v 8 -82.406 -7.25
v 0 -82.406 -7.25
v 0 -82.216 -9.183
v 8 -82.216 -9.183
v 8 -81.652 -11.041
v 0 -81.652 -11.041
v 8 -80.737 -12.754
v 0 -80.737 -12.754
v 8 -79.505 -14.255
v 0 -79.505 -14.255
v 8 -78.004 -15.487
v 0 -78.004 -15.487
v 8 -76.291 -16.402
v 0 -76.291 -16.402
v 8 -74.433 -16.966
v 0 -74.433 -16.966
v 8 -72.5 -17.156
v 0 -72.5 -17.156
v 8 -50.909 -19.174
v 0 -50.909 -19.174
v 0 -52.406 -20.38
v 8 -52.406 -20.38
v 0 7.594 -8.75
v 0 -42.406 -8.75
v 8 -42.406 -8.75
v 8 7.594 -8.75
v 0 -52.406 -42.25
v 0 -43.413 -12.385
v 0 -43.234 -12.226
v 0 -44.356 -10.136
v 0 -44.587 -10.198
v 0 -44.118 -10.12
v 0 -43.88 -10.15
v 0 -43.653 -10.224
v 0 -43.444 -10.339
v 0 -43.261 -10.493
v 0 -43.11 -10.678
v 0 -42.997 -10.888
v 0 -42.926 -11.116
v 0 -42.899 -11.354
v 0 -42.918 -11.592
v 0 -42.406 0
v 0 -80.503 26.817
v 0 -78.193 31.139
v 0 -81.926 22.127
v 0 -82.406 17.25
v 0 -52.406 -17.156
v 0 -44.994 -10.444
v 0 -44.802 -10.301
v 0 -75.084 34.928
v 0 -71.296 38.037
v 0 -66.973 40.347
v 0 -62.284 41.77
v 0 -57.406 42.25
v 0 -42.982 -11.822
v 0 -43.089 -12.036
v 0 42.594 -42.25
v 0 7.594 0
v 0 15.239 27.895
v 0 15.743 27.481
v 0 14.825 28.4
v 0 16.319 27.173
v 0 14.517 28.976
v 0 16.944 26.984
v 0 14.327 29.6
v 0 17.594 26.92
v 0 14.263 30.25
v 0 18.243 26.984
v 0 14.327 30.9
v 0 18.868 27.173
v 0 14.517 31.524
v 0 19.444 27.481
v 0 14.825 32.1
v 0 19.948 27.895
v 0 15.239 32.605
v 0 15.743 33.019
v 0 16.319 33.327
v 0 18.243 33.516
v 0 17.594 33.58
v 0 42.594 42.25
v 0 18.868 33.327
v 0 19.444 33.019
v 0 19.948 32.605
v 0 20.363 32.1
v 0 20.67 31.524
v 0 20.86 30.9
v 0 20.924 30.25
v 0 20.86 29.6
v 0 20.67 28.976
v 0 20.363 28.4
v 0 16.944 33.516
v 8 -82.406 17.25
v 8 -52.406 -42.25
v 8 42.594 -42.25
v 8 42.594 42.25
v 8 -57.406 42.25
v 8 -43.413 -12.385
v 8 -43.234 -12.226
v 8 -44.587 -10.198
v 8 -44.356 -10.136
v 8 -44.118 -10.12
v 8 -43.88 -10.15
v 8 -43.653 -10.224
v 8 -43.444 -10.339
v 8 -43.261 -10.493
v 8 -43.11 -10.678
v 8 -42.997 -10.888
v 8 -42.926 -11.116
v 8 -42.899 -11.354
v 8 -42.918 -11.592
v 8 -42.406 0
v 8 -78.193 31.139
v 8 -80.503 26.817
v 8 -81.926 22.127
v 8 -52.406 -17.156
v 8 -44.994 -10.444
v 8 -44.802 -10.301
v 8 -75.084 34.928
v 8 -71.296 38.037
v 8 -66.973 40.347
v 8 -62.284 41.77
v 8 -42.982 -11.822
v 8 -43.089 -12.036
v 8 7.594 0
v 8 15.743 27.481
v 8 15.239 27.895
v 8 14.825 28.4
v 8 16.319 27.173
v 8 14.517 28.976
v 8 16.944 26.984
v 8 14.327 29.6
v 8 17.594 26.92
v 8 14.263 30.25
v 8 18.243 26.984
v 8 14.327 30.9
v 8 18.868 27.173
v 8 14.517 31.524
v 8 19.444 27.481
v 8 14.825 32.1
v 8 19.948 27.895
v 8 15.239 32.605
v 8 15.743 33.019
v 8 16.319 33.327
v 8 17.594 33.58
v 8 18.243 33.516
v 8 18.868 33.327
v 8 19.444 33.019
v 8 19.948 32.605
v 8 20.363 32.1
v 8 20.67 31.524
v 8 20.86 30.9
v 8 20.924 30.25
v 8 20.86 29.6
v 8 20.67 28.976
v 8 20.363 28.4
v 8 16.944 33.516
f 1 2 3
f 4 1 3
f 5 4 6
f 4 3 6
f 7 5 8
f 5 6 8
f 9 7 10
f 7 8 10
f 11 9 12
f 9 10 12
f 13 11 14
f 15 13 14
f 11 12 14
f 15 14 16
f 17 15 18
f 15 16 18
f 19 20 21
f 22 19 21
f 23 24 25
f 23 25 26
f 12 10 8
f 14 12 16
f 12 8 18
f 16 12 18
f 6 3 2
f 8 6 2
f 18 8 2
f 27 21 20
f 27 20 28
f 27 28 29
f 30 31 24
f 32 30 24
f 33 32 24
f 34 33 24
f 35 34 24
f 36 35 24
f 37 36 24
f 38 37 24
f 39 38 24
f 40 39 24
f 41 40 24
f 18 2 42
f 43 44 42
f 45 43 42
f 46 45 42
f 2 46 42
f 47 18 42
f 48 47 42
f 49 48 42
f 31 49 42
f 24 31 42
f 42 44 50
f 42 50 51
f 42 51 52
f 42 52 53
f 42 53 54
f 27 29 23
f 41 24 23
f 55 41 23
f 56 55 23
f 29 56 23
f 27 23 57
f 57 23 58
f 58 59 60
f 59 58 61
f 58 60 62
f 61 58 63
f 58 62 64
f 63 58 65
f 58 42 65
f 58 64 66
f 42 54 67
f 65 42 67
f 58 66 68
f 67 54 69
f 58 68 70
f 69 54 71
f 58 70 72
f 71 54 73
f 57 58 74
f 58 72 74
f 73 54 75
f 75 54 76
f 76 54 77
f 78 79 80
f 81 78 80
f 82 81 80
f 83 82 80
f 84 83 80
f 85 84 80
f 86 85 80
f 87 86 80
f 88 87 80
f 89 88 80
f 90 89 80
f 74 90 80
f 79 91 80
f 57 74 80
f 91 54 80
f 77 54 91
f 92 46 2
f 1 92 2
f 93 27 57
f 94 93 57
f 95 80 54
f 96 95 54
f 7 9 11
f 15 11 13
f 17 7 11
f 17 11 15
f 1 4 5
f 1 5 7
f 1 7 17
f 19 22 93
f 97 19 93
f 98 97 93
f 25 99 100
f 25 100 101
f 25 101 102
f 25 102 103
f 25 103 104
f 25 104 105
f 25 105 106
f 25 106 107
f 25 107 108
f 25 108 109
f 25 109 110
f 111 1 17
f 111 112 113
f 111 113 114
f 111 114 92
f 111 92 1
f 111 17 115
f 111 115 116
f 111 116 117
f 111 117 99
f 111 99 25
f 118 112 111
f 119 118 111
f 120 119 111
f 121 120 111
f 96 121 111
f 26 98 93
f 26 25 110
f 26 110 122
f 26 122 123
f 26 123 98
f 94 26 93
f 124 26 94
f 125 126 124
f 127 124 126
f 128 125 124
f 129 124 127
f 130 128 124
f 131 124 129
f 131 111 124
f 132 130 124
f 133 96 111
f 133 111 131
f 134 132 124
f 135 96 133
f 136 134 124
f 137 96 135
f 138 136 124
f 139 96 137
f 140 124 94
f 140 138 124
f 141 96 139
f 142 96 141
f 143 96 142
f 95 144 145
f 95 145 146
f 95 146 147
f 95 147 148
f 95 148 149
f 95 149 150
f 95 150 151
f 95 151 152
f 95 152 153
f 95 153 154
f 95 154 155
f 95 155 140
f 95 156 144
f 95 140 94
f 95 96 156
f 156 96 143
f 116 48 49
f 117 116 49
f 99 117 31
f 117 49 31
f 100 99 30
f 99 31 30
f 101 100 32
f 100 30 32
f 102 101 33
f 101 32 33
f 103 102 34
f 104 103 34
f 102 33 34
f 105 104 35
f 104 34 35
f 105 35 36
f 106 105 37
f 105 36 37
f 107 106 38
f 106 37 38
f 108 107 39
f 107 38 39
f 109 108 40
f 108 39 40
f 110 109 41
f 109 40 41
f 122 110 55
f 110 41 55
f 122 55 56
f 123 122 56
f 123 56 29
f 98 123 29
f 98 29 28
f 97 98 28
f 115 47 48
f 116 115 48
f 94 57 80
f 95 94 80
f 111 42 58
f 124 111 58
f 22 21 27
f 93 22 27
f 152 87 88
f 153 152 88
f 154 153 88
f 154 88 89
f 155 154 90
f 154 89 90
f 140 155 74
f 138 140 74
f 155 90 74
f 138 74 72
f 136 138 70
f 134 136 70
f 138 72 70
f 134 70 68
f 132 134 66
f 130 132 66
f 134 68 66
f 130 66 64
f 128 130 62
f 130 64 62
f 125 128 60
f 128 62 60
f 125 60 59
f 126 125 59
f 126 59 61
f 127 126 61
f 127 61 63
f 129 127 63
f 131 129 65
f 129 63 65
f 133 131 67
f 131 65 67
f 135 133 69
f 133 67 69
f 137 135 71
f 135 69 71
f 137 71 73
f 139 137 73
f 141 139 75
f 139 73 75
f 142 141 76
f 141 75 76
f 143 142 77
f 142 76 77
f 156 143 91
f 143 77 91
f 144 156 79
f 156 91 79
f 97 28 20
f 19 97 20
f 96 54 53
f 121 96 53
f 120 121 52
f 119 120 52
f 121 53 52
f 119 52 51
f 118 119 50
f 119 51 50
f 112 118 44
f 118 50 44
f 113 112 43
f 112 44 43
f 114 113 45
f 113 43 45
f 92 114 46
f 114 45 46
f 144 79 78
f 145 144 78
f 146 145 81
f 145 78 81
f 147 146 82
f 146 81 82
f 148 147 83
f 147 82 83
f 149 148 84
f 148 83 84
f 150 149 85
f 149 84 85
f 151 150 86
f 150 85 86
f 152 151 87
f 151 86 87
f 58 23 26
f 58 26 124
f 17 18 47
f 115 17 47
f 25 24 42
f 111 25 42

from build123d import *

# Parameters (mm, degrees)
F0_W     = 50
F0_H     = 8.75
F1_DEPTH = 8


with BuildPart() as f1:
    # F0 (on Right) → F1 (new body)
    with BuildSketch(Plane.YZ):
        with BuildLine():
            Line((17.593615, 42.25), (-19.906385, 42.25))
            Line((-19.906385, 42.25), (-57.406385, 42.25))
            ThreePointArc((-57.406385, 42.25), (-75.084055, 34.92767), (-82.406385, 17.25))
            Line((-82.406385, 17.25), (-82.406385, -7.25))
            ThreePointArc((-82.406385, -7.25), (-79.504872, -14.254872), (-72.5, -17.156385))
            Line((-72.5, -17.156385), (-52.406385, -17.156385))
            Line((-52.406385, -17.156385), (-44.993822, -10.444165))
            ThreePointArc((-44.993822, -10.444165), (-43.180784, -10.581559), (-43.412569, -12.384961))
            Line((-43.412569, -12.384961), (-50.909492, -19.173572))
            Line((-50.909492, -19.173572), (-52.406385, -20.379891))
            Line((-52.406385, -20.379891), (-52.406385, -42.25))
            Line((-52.406385, -42.25), (42.593615, -42.25))
            Line((42.593615, -42.25), (42.593615, 0))
            Line((42.593615, 0), (42.593615, 42.25))
            Line((42.593615, 42.25), (17.593615, 42.25))
        make_face()
        with Locations((-17.406385, -4.375)):
            Rectangle(F0_W, F0_H, mode=Mode.SUBTRACT)
        with BuildLine():
            ThreePointArc((20.923833, 30.25), (15.238794, 27.89518), (17.593615, 33.580219))
            ThreePointArc((17.593615, 33.580219), (19.948435, 32.60482), (20.923833, 30.25))
        make_face(mode=Mode.SUBTRACT)
    extrude(amount=F1_DEPTH)


solid = f1.part
